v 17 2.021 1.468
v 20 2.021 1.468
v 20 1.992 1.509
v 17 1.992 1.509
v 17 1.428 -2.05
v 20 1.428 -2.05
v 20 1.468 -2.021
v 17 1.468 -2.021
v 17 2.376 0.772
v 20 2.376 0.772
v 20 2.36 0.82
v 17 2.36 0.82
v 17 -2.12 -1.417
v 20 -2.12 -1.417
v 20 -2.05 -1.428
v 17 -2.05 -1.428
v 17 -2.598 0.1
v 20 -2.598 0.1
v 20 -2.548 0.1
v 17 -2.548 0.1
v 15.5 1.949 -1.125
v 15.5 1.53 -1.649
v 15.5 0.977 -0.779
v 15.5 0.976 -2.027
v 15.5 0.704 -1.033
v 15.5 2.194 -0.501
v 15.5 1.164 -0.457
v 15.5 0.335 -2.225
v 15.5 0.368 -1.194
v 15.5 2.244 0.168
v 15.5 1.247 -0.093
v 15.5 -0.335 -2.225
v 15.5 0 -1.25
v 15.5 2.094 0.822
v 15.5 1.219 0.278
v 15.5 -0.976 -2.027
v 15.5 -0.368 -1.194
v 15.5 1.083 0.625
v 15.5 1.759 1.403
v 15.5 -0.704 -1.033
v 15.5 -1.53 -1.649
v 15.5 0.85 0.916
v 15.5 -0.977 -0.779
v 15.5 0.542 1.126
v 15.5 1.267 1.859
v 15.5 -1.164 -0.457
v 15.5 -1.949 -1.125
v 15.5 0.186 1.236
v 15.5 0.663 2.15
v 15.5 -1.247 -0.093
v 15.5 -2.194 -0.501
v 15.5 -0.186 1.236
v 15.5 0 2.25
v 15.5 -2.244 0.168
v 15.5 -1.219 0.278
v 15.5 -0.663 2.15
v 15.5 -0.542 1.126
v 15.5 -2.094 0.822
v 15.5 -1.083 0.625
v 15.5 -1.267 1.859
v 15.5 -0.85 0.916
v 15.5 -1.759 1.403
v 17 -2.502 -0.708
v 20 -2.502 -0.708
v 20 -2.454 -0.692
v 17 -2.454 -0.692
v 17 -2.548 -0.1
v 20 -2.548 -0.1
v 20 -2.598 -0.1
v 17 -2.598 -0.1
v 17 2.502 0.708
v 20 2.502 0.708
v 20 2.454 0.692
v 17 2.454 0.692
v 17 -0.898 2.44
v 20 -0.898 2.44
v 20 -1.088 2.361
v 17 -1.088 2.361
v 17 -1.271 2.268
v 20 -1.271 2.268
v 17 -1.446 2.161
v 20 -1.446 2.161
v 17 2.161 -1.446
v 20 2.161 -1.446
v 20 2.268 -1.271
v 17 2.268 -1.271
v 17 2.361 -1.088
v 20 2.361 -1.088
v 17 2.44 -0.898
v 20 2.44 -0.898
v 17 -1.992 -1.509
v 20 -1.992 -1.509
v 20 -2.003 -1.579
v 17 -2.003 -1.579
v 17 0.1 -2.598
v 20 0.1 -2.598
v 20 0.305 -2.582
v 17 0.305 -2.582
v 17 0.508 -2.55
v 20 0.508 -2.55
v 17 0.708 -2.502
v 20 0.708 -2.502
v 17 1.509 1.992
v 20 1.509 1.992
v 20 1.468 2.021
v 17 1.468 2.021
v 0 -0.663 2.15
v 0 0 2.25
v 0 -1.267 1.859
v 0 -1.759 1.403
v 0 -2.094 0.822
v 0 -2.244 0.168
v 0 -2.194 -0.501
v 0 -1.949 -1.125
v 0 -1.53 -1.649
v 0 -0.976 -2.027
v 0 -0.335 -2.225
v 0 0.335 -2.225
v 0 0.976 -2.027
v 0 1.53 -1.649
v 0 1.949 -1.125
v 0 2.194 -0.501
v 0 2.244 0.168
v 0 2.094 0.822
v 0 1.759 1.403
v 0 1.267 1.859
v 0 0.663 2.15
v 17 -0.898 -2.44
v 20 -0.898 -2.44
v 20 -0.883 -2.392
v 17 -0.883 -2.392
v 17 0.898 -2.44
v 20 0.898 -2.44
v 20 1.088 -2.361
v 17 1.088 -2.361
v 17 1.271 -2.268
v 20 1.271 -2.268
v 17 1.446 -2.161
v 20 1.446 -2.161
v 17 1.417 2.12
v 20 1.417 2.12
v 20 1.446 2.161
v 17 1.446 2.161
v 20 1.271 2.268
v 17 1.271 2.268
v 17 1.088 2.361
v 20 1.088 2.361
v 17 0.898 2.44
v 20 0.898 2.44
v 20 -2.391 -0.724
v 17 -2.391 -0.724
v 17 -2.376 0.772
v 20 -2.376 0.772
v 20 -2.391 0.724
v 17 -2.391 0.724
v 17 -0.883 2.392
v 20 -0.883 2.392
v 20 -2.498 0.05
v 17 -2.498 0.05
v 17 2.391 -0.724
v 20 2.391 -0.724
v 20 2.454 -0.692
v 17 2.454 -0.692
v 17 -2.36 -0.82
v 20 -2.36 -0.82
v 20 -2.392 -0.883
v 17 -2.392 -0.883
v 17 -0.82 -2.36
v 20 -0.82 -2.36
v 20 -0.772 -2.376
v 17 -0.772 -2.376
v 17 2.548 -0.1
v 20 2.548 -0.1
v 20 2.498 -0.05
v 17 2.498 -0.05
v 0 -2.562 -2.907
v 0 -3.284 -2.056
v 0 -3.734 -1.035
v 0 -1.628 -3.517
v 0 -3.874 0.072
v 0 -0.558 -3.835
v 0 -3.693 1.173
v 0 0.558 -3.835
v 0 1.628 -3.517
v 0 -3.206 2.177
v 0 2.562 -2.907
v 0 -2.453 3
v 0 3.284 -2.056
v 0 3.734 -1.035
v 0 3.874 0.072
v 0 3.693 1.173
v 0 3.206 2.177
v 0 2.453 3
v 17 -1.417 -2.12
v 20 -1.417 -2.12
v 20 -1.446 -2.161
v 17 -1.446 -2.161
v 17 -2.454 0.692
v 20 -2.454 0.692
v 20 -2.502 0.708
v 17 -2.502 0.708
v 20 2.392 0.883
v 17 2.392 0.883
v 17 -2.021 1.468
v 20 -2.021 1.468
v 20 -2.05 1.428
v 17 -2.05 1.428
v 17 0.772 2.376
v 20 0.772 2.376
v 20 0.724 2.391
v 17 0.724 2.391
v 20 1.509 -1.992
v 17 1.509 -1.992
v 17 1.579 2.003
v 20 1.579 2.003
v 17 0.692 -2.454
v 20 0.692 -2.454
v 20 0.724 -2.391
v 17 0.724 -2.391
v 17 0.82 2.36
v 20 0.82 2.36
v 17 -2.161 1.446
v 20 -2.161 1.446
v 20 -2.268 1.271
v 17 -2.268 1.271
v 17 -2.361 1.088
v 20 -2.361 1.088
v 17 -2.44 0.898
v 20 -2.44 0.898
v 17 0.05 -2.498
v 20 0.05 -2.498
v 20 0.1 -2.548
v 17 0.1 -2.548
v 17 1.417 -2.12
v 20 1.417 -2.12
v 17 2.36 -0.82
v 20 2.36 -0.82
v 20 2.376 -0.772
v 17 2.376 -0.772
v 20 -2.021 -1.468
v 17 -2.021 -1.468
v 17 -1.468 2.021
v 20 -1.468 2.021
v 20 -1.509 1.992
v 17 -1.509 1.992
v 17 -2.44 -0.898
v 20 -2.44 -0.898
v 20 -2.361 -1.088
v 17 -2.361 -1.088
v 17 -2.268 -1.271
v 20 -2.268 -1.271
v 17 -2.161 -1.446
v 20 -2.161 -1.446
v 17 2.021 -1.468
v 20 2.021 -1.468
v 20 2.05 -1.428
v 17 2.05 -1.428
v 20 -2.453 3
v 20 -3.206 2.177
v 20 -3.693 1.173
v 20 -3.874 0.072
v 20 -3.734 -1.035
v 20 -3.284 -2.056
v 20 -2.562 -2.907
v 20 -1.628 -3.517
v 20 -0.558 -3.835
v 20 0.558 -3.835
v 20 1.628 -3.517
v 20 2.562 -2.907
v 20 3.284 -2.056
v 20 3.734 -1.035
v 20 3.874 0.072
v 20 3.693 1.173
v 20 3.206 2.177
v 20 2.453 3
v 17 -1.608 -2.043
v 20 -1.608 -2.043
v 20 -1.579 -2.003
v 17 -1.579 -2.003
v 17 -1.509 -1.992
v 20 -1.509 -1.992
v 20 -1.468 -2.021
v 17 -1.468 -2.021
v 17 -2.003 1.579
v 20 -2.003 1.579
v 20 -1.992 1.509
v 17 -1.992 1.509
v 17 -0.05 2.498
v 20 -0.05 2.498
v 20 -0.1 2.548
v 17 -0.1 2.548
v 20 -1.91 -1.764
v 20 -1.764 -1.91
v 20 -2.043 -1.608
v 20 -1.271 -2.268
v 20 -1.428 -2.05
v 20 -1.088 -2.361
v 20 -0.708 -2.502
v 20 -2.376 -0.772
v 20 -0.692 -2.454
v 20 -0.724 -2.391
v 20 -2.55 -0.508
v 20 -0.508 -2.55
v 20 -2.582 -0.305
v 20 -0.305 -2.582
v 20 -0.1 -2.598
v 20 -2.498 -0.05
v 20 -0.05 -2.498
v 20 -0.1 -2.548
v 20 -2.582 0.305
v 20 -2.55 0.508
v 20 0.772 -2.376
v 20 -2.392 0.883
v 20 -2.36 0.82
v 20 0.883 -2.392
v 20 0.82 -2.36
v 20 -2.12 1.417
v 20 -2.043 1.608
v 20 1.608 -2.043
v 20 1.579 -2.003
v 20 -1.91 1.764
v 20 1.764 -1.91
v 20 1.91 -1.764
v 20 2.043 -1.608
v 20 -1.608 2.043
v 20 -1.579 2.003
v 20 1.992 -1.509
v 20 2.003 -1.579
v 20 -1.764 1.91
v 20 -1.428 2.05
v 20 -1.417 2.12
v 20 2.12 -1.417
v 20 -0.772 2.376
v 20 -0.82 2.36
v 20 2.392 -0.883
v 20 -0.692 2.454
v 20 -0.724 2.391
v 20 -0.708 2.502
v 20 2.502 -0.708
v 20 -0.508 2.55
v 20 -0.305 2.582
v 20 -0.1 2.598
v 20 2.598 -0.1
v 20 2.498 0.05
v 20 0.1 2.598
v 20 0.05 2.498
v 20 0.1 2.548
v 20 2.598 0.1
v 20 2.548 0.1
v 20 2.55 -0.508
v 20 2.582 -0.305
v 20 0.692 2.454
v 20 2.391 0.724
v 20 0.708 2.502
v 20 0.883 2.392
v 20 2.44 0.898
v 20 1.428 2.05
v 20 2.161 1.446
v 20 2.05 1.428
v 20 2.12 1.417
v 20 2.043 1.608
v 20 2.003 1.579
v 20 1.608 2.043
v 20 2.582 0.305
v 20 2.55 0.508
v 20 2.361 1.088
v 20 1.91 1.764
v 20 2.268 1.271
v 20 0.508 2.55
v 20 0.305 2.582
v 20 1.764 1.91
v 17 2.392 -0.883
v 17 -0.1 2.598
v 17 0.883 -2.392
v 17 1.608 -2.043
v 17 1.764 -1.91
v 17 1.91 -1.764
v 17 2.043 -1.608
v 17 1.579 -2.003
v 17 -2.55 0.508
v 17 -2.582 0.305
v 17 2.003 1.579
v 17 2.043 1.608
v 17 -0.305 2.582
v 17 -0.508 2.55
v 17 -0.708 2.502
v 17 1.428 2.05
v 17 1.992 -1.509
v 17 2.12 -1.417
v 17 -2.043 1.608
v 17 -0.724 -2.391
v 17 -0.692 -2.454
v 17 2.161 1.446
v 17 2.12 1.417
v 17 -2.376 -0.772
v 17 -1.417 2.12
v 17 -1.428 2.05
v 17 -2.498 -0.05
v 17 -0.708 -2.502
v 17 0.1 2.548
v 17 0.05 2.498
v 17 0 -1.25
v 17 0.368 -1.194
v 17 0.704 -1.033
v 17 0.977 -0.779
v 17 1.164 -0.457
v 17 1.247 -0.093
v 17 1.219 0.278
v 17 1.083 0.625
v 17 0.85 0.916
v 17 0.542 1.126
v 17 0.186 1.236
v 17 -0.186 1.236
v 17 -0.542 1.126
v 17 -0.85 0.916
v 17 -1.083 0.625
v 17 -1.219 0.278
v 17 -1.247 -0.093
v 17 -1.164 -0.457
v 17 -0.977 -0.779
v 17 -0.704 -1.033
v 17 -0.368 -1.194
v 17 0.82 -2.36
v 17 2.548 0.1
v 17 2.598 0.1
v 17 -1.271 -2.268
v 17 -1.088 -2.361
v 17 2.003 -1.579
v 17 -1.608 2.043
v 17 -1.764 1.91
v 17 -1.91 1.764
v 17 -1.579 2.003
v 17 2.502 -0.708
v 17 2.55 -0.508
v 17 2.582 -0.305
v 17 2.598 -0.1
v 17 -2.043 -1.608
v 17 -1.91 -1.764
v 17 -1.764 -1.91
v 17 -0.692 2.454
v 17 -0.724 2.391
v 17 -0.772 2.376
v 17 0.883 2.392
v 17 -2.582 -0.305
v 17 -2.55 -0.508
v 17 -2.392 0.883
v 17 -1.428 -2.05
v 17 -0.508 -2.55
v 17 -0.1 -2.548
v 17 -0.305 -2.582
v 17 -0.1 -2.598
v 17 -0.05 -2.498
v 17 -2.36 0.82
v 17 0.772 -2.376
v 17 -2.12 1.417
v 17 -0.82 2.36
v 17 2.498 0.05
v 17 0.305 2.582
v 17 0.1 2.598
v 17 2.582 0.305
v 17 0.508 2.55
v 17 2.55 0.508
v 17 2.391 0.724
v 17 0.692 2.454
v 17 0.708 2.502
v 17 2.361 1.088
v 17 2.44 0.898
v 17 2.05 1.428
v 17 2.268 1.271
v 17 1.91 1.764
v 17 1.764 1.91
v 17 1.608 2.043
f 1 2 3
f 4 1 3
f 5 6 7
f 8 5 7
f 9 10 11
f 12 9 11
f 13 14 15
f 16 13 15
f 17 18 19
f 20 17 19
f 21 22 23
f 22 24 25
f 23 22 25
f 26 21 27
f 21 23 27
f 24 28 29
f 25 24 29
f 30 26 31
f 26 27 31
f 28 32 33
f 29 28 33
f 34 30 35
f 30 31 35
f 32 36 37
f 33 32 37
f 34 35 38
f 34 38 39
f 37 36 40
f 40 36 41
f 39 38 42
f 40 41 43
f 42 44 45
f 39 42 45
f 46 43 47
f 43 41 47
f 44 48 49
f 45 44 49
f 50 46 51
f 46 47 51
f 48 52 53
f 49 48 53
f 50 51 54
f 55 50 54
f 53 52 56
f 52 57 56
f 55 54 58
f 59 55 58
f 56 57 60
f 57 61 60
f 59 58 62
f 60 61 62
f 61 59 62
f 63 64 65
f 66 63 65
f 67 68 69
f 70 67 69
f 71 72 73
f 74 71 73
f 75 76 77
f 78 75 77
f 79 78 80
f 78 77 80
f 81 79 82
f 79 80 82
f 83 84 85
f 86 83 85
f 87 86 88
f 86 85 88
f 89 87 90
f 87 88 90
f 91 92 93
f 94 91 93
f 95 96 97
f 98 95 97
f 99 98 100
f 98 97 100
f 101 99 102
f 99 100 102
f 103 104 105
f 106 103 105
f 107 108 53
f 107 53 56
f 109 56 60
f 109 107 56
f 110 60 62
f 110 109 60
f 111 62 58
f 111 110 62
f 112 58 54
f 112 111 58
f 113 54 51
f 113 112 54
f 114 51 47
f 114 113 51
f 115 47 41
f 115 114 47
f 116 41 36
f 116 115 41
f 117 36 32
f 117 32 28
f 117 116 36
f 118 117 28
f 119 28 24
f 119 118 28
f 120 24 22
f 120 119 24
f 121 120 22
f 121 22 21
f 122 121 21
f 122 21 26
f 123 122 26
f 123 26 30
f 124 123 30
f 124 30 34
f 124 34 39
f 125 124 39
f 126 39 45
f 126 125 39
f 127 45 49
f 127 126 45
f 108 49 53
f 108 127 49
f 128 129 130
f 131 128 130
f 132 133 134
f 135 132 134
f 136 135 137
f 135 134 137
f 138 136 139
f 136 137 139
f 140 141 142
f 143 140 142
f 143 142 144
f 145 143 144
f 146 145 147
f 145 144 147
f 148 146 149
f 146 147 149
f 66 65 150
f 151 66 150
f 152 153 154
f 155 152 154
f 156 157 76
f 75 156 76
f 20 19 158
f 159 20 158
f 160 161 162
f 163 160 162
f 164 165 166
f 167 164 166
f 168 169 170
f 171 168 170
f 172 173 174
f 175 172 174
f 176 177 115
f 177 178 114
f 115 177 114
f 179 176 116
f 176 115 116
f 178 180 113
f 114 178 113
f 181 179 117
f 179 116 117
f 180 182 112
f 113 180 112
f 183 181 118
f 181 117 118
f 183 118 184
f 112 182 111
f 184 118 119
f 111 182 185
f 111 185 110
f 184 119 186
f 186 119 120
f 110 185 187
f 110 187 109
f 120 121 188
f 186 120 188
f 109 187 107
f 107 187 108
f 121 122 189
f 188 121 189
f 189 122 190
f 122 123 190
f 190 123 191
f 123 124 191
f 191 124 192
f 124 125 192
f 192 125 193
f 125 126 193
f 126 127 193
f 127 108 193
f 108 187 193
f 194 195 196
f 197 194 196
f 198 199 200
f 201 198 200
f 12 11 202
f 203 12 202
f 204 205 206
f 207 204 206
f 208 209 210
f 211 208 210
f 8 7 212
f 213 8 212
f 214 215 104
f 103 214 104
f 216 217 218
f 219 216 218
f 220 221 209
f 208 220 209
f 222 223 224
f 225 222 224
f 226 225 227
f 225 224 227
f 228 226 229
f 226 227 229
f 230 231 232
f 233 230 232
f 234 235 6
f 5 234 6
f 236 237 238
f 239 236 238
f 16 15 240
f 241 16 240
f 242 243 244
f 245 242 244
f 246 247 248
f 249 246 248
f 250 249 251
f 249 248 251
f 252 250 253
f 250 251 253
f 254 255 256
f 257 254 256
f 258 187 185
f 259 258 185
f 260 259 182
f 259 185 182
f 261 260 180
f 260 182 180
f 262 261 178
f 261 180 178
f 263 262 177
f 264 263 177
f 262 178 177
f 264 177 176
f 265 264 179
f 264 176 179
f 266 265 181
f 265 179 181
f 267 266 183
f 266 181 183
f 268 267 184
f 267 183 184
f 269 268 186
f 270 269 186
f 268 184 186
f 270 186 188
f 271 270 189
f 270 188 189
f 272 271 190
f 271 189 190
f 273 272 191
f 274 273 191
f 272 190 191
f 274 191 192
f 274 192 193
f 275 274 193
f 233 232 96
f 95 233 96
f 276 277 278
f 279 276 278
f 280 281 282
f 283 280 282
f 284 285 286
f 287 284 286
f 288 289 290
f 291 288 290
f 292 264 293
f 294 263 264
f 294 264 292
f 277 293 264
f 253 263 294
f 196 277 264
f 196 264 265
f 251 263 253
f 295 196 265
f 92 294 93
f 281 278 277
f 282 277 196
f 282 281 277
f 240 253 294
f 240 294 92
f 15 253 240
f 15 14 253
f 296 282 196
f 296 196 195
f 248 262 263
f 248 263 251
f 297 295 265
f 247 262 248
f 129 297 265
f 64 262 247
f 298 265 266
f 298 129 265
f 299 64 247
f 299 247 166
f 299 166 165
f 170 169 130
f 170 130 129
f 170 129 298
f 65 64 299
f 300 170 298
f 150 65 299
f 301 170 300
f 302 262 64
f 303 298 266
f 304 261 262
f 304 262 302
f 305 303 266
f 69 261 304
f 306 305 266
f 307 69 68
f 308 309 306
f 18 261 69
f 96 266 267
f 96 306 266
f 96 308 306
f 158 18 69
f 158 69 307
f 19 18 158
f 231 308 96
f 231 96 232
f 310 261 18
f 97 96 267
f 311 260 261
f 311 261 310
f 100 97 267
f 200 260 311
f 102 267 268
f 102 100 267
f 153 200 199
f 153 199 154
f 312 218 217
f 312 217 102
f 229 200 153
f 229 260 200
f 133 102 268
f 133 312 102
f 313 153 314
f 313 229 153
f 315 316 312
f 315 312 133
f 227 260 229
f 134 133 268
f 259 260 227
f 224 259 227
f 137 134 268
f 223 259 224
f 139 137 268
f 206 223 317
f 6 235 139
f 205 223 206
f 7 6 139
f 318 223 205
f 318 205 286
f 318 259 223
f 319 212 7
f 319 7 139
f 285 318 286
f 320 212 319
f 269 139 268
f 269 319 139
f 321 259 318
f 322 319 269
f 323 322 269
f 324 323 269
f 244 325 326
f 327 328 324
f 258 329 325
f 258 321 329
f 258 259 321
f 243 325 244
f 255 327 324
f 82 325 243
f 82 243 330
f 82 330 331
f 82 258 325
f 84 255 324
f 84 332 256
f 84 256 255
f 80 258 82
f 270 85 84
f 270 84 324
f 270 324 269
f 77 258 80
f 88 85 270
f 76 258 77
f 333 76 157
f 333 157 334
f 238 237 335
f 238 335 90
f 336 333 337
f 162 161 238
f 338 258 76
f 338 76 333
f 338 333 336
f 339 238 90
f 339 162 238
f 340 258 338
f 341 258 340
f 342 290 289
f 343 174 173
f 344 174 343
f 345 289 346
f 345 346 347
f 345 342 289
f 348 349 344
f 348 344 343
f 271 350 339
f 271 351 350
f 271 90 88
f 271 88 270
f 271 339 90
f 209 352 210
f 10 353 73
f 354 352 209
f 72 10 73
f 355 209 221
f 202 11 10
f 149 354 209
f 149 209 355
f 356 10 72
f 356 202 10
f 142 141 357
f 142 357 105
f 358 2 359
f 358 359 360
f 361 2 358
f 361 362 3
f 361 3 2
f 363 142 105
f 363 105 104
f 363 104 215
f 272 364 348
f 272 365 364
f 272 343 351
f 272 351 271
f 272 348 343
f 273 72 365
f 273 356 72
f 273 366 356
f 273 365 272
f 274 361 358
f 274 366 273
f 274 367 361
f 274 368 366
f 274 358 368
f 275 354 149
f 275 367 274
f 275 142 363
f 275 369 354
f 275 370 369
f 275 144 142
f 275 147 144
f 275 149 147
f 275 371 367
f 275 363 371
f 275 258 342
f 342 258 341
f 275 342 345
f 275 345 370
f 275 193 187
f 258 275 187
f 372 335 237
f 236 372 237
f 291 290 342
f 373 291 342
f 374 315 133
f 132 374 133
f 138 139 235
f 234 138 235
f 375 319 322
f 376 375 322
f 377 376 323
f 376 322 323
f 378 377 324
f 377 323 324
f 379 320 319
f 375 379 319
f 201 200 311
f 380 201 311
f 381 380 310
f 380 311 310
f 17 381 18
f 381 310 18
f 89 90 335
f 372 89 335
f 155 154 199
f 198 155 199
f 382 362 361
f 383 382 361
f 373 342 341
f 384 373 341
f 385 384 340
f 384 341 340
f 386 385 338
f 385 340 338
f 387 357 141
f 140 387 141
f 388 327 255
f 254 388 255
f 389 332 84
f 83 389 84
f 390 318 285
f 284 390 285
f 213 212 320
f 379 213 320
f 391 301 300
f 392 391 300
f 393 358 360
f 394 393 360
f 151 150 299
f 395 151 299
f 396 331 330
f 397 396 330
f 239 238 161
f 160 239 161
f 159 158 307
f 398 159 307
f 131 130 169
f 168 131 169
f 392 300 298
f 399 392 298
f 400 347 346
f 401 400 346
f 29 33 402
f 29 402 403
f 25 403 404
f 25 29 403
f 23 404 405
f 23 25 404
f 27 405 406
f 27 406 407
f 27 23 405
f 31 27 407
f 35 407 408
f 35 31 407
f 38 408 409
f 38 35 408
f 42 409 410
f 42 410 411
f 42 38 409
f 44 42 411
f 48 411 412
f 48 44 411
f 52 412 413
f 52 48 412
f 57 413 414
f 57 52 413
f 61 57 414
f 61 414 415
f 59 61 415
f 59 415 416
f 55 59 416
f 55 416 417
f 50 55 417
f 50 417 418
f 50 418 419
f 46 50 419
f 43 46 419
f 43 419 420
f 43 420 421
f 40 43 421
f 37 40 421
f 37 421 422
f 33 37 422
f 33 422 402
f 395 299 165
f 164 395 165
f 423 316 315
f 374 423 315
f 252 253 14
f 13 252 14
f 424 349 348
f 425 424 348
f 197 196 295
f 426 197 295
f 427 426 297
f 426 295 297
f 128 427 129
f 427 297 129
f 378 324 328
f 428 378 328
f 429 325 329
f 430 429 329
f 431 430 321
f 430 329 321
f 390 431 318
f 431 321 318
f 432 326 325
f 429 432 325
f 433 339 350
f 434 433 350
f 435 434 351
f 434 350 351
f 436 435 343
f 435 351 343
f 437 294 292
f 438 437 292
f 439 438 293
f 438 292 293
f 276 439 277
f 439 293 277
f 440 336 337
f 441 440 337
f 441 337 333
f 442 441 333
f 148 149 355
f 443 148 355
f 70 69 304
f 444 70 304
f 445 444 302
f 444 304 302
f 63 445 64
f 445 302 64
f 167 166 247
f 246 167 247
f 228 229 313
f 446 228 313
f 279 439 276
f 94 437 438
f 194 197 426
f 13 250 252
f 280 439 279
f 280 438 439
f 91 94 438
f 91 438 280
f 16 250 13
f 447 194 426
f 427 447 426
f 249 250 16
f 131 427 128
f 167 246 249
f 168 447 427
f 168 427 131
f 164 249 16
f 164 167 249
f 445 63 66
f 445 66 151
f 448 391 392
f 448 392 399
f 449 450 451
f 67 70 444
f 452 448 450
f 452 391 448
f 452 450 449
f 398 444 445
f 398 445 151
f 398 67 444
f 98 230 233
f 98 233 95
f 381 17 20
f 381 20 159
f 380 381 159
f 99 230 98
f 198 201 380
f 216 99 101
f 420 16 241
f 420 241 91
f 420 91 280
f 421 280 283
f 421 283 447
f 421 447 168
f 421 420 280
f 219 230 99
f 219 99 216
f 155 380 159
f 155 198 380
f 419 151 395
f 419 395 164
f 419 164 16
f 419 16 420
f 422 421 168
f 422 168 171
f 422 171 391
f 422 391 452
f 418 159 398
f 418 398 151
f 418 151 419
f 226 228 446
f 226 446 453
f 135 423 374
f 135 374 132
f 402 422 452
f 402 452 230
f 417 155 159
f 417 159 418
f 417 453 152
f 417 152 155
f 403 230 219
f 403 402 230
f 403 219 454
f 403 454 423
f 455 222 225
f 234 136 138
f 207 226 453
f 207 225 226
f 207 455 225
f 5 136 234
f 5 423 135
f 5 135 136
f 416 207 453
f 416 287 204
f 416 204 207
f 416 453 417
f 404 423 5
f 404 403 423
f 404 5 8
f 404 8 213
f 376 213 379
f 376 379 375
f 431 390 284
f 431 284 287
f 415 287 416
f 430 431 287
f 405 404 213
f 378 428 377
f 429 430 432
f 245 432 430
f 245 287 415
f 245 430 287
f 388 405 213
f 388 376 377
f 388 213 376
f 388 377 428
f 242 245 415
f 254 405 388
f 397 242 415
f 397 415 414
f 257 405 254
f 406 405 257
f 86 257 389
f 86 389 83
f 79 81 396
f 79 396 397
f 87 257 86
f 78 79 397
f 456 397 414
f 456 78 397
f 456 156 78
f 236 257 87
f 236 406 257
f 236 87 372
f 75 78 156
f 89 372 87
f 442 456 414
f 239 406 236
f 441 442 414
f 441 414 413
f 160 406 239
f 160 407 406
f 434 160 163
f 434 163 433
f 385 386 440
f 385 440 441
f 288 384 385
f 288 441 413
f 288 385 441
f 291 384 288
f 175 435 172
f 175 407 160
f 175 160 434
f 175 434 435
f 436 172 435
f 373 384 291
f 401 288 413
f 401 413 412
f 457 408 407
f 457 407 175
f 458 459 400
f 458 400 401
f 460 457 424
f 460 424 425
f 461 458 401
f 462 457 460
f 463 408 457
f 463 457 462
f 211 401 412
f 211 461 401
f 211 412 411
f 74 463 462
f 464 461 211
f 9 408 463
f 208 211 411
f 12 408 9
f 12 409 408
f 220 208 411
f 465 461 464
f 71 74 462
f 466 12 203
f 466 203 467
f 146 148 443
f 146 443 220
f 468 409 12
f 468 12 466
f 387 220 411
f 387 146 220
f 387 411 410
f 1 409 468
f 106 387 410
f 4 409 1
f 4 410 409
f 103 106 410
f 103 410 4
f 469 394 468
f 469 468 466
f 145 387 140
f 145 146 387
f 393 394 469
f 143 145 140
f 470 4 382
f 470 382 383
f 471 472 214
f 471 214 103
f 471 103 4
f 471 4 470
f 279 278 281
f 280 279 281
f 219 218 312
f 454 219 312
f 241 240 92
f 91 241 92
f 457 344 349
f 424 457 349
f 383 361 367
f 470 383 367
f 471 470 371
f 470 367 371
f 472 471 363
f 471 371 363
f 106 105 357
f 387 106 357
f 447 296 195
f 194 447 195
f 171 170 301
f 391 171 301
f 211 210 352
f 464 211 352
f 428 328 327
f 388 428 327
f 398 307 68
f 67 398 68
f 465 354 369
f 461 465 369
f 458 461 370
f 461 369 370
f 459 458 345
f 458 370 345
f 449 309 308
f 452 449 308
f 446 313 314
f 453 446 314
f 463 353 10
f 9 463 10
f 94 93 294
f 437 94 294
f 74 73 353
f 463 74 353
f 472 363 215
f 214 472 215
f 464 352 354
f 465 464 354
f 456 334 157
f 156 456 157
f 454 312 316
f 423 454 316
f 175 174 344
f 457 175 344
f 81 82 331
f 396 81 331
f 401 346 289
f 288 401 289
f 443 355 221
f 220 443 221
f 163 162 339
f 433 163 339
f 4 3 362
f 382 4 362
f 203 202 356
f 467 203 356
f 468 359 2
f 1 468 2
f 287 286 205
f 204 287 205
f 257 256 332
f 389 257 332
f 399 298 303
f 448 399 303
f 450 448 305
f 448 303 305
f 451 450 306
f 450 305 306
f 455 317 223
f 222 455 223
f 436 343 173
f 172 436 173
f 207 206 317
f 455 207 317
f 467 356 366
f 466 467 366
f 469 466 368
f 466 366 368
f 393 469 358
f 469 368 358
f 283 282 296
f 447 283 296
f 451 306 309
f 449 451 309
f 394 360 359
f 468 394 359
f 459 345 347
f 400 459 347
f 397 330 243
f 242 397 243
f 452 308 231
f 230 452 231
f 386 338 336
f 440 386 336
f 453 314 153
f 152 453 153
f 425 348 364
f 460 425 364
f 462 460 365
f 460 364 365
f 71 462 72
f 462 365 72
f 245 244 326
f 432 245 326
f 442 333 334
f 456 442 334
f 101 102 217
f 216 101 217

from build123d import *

# Parameters (mm, degrees)
CROQUIS1_R              = 2.25
CROQUIS1_R_2            = 1.25
SALIENTE_EXTRUIR1_DEPTH = 20
CORTAR_EXTRUIR2_DEPTH   = 3
CROQUIS1_3_R            = 2.25
CROQUIS1_3_R_2          = 1.25
CORTAR_EXTRUIR1_DEPTH   = 15.5
CROQUIS1_5_R            = 1.25
CORTAR_EXTRUIR4_DEPTH   = 17


with BuildPart() as part:
    # Croquis1 → Saliente-Extruir1 (new body)
    with BuildSketch(Plane.YZ):
        with BuildLine():
            Line((2.452677109, 3), (-2.452677109, 3))
            ThreePointArc((-2.452677109, 3), (0, -3.875), (2.452677109, 3))
        make_face()
        Circle(CROQUIS1_R, mode=Mode.SUBTRACT)
        Circle(CROQUIS1_R)
        Circle(CROQUIS1_R_2, mode=Mode.SUBTRACT)
        Circle(CROQUIS1_R_2)
    extrude(amount=SALIENTE_EXTRUIR1_DEPTH)

    # Croquis2 → Cortar-Extruir2 (cut)
    with BuildSketch(Plane.YZ.offset(20)):
        with BuildLine():
            Line((-2.498076211, 0.05), (-2.498076211, 0))
            Line((-2.498076211, 0), (-2.498076211, -0.05))
            Line((-2.498076211, -0.05), (-2.548076211, -0.1))
            Line((-2.548076211, -0.1), (-2.598076211, -0.1))
            ThreePointArc((-2.598076211, -0.1), (-2.567989686, -0.406729609), (-2.50181901, -0.70774405))
            Line((-2.50181901, -0.70774405), (-2.454266184, -0.692293201))
            Line((-2.454266184, -0.692293201), (-2.391262509, -0.724395177))
            Line((-2.391262509, -0.724395177), (-2.375811659, -0.771948003))
            Line((-2.375811659, -0.771948003), (-2.360360809, -0.819500828))
            Line((-2.360360809, -0.819500828), (-2.392462785, -0.882504504))
            Line((-2.392462785, -0.882504504), (-2.440015611, -0.897955354))
            ThreePointArc((-2.440015611, -0.897955354), (-2.316616963, -1.180375299), (-2.160666333, -1.446209182))
            Line((-2.160666333, -1.446209182), (-2.120215483, -1.416819919))
            Line((-2.120215483, -1.416819919), (-2.050375371, -1.427881506))
            Line((-2.050375371, -1.427881506), (-2.020986108, -1.468332356))
            Line((-2.020986108, -1.468332356), (-1.991596846, -1.508783206))
            Line((-1.991596846, -1.508783206), (-2.002658433, -1.578623318))
            Line((-2.002658433, -1.578623318), (-2.043109282, -1.608012581))
            ThreePointArc((-2.043109282, -1.608012581), (-1.838477631, -1.838477631), (-1.608012581, -2.043109282))
            Line((-1.608012581, -2.043109282), (-1.578623318, -2.002658433))
            Line((-1.578623318, -2.002658433), (-1.508783206, -1.991596846))
            Line((-1.508783206, -1.991596846), (-1.468332356, -2.020986108))
            Line((-1.468332356, -2.020986108), (-1.427881506, -2.050375371))
            Line((-1.427881506, -2.050375371), (-1.416819919, -2.120215483))
            Line((-1.416819919, -2.120215483), (-1.446209182, -2.160666333))
            ThreePointArc((-1.446209182, -2.160666333), (-1.180375299, -2.316616963), (-0.897955354, -2.440015611))
            Line((-0.897955354, -2.440015611), (-0.882504504, -2.392462785))
            Line((-0.882504504, -2.392462785), (-0.819500828, -2.360360809))
            Line((-0.819500828, -2.360360809), (-0.771948003, -2.375811659))
            Line((-0.771948003, -2.375811659), (-0.724395177, -2.391262509))
            Line((-0.724395177, -2.391262509), (-0.692293201, -2.454266184))
            Line((-0.692293201, -2.454266184), (-0.70774405, -2.50181901))
            ThreePointArc((-0.70774405, -2.50181901), (-0.406729609, -2.567989686), (-0.1, -2.598076211))
            Line((-0.1, -2.598076211), (-0.1, -2.548076211))
            Line((-0.1, -2.548076211), (-0.05, -2.498076211))
            Line((-0.05, -2.498076211), (0, -2.498076211))
            Line((0, -2.498076211), (0.05, -2.498076211))
            Line((0.05, -2.498076211), (0.1, -2.548076211))
            Line((0.1, -2.548076211), (0.1, -2.598076211))
            ThreePointArc((0.1, -2.598076211), (0.406729609, -2.567989686), (0.70774405, -2.50181901))
            Line((0.70774405, -2.50181901), (0.692293201, -2.454266184))
            Line((0.692293201, -2.454266184), (0.724395177, -2.391262509))
            Line((0.724395177, -2.391262509), (0.771948003, -2.375811659))
            Line((0.771948003, -2.375811659), (0.819500828, -2.360360809))
            Line((0.819500828, -2.360360809), (0.882504504, -2.392462785))
            Line((0.882504504, -2.392462785), (0.897955354, -2.440015611))
            ThreePointArc((0.897955354, -2.440015611), (1.180375299, -2.316616963), (1.446209182, -2.160666333))
            Line((1.446209182, -2.160666333), (1.416819919, -2.120215483))
            Line((1.416819919, -2.120215483), (1.427881506, -2.050375371))
            Line((1.427881506, -2.050375371), (1.468332356, -2.020986108))
            Line((1.468332356, -2.020986108), (1.508783206, -1.991596846))
            Line((1.508783206, -1.991596846), (1.578623318, -2.002658433))
            Line((1.578623318, -2.002658433), (1.608012581, -2.043109282))
            ThreePointArc((1.608012581, -2.043109282), (1.838477631, -1.838477631), (2.043109282, -1.608012581))
            Line((2.043109282, -1.608012581), (2.002658433, -1.578623318))
            Line((2.002658433, -1.578623318), (1.991596846, -1.508783206))
            Line((1.991596846, -1.508783206), (2.020986108, -1.468332356))
            Line((2.020986108, -1.468332356), (2.050375371, -1.427881506))
            Line((2.050375371, -1.427881506), (2.120215483, -1.416819919))
            Line((2.120215483, -1.416819919), (2.160666333, -1.446209182))
            ThreePointArc((2.160666333, -1.446209182), (2.316616963, -1.180375299), (2.440015611, -0.897955354))
            Line((2.440015611, -0.897955354), (2.392462785, -0.882504504))
            Line((2.392462785, -0.882504504), (2.360360809, -0.819500828))
            Line((2.360360809, -0.819500828), (2.375811659, -0.771948003))
            Line((2.375811659, -0.771948003), (2.391262509, -0.724395177))
            Line((2.391262509, -0.724395177), (2.454266184, -0.692293201))
            Line((2.454266184, -0.692293201), (2.50181901, -0.70774405))
            ThreePointArc((2.50181901, -0.70774405), (2.567989686, -0.406729609), (2.598076211, -0.1))
            Line((2.598076211, -0.1), (2.548076211, -0.1))
            Line((2.548076211, -0.1), (2.498076211, -0.05))
            Line((2.498076211, -0.05), (2.498076211, 0))
            Line((2.498076211, 0), (2.498076211, 0.05))
            Line((2.498076211, 0.05), (2.548076211, 0.1))
            Line((2.548076211, 0.1), (2.598076211, 0.1))
            ThreePointArc((2.598076211, 0.1), (2.567989686, 0.406729609), (2.50181901, 0.70774405))
            Line((2.50181901, 0.70774405), (2.454266184, 0.692293201))
            Line((2.454266184, 0.692293201), (2.391262509, 0.724395177))
            Line((2.391262509, 0.724395177), (2.375811659, 0.771948003))
            Line((2.375811659, 0.771948003), (2.360360809, 0.819500828))
            Line((2.360360809, 0.819500828), (2.392462785, 0.882504504))
            Line((2.392462785, 0.882504504), (2.440015611, 0.897955354))
            ThreePointArc((2.440015611, 0.897955354), (2.316616963, 1.180375299), (2.160666333, 1.446209182))
            Line((2.160666333, 1.446209182), (2.120215483, 1.416819919))
            Line((2.120215483, 1.416819919), (2.050375371, 1.427881506))
            Line((2.050375371, 1.427881506), (2.020986108, 1.468332356))
            Line((2.020986108, 1.468332356), (1.991596846, 1.508783206))
            Line((1.991596846, 1.508783206), (2.002658433, 1.578623318))
            Line((2.002658433, 1.578623318), (2.043109282, 1.608012581))
            ThreePointArc((2.043109282, 1.608012581), (1.838477631, 1.838477631), (1.608012581, 2.043109282))
            Line((1.608012581, 2.043109282), (1.578623318, 2.002658433))
            Line((1.578623318, 2.002658433), (1.508783206, 1.991596846))
            Line((1.508783206, 1.991596846), (1.468332356, 2.020986108))
            Line((1.468332356, 2.020986108), (1.427881506, 2.050375371))
            Line((1.427881506, 2.050375371), (1.416819919, 2.120215483))
            Line((1.416819919, 2.120215483), (1.446209182, 2.160666333))
            ThreePointArc((1.446209182, 2.160666333), (1.180375299, 2.316616963), (0.897955354, 2.440015611))
            Line((0.897955354, 2.440015611), (0.882504504, 2.392462785))
            Line((0.882504504, 2.392462785), (0.819500828, 2.360360809))
            Line((0.819500828, 2.360360809), (0.771948003, 2.375811659))
            Line((0.771948003, 2.375811659), (0.724395177, 2.391262509))
            Line((0.724395177, 2.391262509), (0.692293201, 2.454266184))
            Line((0.692293201, 2.454266184), (0.70774405, 2.50181901))
            ThreePointArc((0.70774405, 2.50181901), (0.406729609, 2.567989686), (0.1, 2.598076211))
            Line((0.1, 2.598076211), (0.1, 2.548076211))
            Line((0.1, 2.548076211), (0.05, 2.498076211))
            Line((0.05, 2.498076211), (0, 2.498076211))
            Line((0, 2.498076211), (-0.05, 2.498076211))
            Line((-0.05, 2.498076211), (-0.1, 2.548076211))
            Line((-0.1, 2.548076211), (-0.1, 2.598076211))
            ThreePointArc((-0.1, 2.598076211), (-0.406729609, 2.567989686), (-0.70774405, 2.50181901))
            Line((-0.70774405, 2.50181901), (-0.692293201, 2.454266184))
            Line((-0.692293201, 2.454266184), (-0.724395177, 2.391262509))
            Line((-0.724395177, 2.391262509), (-0.771948003, 2.375811659))
            Line((-0.771948003, 2.375811659), (-0.819500828, 2.360360809))
            Line((-0.819500828, 2.360360809), (-0.882504504, 2.392462785))
            Line((-0.882504504, 2.392462785), (-0.897955354, 2.440015611))
            ThreePointArc((-0.897955354, 2.440015611), (-1.180375299, 2.316616963), (-1.446209182, 2.160666333))
            Line((-1.446209182, 2.160666333), (-1.416819919, 2.120215483))
            Line((-1.416819919, 2.120215483), (-1.427881506, 2.050375371))
            Line((-1.427881506, 2.050375371), (-1.468332356, 2.020986108))
            Line((-1.468332356, 2.020986108), (-1.508783206, 1.991596846))
            Line((-1.508783206, 1.991596846), (-1.578623318, 2.002658433))
            Line((-1.578623318, 2.002658433), (-1.608012581, 2.043109282))
            ThreePointArc((-1.608012581, 2.043109282), (-1.838477631, 1.838477631), (-2.043109282, 1.608012581))
            Line((-2.043109282, 1.608012581), (-2.002658433, 1.578623318))
            Line((-2.002658433, 1.578623318), (-1.991596846, 1.508783206))
            Line((-1.991596846, 1.508783206), (-2.020986108, 1.468332356))
            Line((-2.020986108, 1.468332356), (-2.050375371, 1.427881506))
            Line((-2.050375371, 1.427881506), (-2.120215483, 1.416819919))
            Line((-2.120215483, 1.416819919), (-2.160666333, 1.446209182))
            ThreePointArc((-2.160666333, 1.446209182), (-2.316616963, 1.180375299), (-2.440015611, 0.897955354))
            Line((-2.440015611, 0.897955354), (-2.392462785, 0.882504504))
            Line((-2.392462785, 0.882504504), (-2.360360809, 0.819500828))
            Line((-2.360360809, 0.819500828), (-2.375811659, 0.771948003))
            Line((-2.375811659, 0.771948003), (-2.391262509, 0.724395177))
            Line((-2.391262509, 0.724395177), (-2.454266184, 0.692293201))
            Line((-2.454266184, 0.692293201), (-2.50181901, 0.70774405))
            ThreePointArc((-2.50181901, 0.70774405), (-2.567989686, 0.406729609), (-2.598076211, 0.1))
            Line((-2.598076211, 0.1), (-2.548076211, 0.1))
            Line((-2.548076211, 0.1), (-2.498076211, 0.05))
        make_face()
    extrude(amount=-CORTAR_EXTRUIR2_DEPTH, mode=Mode.SUBTRACT)

    # Croquis1<3> → Cortar-Extruir1 (cut)
    with BuildSketch(Plane.YZ):
        with Locations(Location((0, 0, 0), (0, 0, 90))):
            Circle(CROQUIS1_3_R)
        with Locations(Location((0, 0, 0), (0, 0, 90))):
            Circle(CROQUIS1_3_R_2, mode=Mode.SUBTRACT)
    extrude(amount=CORTAR_EXTRUIR1_DEPTH, mode=Mode.SUBTRACT)

    # Croquis1<5> → Cortar-Extruir4 (cut)
    with BuildSketch(Plane.YZ):
        with Locations(Location((0, 0, 0), (0, 0, 270))):
            Circle(CROQUIS1_5_R)
    extrude(amount=CORTAR_EXTRUIR4_DEPTH, mode=Mode.SUBTRACT)


solid = part.part
